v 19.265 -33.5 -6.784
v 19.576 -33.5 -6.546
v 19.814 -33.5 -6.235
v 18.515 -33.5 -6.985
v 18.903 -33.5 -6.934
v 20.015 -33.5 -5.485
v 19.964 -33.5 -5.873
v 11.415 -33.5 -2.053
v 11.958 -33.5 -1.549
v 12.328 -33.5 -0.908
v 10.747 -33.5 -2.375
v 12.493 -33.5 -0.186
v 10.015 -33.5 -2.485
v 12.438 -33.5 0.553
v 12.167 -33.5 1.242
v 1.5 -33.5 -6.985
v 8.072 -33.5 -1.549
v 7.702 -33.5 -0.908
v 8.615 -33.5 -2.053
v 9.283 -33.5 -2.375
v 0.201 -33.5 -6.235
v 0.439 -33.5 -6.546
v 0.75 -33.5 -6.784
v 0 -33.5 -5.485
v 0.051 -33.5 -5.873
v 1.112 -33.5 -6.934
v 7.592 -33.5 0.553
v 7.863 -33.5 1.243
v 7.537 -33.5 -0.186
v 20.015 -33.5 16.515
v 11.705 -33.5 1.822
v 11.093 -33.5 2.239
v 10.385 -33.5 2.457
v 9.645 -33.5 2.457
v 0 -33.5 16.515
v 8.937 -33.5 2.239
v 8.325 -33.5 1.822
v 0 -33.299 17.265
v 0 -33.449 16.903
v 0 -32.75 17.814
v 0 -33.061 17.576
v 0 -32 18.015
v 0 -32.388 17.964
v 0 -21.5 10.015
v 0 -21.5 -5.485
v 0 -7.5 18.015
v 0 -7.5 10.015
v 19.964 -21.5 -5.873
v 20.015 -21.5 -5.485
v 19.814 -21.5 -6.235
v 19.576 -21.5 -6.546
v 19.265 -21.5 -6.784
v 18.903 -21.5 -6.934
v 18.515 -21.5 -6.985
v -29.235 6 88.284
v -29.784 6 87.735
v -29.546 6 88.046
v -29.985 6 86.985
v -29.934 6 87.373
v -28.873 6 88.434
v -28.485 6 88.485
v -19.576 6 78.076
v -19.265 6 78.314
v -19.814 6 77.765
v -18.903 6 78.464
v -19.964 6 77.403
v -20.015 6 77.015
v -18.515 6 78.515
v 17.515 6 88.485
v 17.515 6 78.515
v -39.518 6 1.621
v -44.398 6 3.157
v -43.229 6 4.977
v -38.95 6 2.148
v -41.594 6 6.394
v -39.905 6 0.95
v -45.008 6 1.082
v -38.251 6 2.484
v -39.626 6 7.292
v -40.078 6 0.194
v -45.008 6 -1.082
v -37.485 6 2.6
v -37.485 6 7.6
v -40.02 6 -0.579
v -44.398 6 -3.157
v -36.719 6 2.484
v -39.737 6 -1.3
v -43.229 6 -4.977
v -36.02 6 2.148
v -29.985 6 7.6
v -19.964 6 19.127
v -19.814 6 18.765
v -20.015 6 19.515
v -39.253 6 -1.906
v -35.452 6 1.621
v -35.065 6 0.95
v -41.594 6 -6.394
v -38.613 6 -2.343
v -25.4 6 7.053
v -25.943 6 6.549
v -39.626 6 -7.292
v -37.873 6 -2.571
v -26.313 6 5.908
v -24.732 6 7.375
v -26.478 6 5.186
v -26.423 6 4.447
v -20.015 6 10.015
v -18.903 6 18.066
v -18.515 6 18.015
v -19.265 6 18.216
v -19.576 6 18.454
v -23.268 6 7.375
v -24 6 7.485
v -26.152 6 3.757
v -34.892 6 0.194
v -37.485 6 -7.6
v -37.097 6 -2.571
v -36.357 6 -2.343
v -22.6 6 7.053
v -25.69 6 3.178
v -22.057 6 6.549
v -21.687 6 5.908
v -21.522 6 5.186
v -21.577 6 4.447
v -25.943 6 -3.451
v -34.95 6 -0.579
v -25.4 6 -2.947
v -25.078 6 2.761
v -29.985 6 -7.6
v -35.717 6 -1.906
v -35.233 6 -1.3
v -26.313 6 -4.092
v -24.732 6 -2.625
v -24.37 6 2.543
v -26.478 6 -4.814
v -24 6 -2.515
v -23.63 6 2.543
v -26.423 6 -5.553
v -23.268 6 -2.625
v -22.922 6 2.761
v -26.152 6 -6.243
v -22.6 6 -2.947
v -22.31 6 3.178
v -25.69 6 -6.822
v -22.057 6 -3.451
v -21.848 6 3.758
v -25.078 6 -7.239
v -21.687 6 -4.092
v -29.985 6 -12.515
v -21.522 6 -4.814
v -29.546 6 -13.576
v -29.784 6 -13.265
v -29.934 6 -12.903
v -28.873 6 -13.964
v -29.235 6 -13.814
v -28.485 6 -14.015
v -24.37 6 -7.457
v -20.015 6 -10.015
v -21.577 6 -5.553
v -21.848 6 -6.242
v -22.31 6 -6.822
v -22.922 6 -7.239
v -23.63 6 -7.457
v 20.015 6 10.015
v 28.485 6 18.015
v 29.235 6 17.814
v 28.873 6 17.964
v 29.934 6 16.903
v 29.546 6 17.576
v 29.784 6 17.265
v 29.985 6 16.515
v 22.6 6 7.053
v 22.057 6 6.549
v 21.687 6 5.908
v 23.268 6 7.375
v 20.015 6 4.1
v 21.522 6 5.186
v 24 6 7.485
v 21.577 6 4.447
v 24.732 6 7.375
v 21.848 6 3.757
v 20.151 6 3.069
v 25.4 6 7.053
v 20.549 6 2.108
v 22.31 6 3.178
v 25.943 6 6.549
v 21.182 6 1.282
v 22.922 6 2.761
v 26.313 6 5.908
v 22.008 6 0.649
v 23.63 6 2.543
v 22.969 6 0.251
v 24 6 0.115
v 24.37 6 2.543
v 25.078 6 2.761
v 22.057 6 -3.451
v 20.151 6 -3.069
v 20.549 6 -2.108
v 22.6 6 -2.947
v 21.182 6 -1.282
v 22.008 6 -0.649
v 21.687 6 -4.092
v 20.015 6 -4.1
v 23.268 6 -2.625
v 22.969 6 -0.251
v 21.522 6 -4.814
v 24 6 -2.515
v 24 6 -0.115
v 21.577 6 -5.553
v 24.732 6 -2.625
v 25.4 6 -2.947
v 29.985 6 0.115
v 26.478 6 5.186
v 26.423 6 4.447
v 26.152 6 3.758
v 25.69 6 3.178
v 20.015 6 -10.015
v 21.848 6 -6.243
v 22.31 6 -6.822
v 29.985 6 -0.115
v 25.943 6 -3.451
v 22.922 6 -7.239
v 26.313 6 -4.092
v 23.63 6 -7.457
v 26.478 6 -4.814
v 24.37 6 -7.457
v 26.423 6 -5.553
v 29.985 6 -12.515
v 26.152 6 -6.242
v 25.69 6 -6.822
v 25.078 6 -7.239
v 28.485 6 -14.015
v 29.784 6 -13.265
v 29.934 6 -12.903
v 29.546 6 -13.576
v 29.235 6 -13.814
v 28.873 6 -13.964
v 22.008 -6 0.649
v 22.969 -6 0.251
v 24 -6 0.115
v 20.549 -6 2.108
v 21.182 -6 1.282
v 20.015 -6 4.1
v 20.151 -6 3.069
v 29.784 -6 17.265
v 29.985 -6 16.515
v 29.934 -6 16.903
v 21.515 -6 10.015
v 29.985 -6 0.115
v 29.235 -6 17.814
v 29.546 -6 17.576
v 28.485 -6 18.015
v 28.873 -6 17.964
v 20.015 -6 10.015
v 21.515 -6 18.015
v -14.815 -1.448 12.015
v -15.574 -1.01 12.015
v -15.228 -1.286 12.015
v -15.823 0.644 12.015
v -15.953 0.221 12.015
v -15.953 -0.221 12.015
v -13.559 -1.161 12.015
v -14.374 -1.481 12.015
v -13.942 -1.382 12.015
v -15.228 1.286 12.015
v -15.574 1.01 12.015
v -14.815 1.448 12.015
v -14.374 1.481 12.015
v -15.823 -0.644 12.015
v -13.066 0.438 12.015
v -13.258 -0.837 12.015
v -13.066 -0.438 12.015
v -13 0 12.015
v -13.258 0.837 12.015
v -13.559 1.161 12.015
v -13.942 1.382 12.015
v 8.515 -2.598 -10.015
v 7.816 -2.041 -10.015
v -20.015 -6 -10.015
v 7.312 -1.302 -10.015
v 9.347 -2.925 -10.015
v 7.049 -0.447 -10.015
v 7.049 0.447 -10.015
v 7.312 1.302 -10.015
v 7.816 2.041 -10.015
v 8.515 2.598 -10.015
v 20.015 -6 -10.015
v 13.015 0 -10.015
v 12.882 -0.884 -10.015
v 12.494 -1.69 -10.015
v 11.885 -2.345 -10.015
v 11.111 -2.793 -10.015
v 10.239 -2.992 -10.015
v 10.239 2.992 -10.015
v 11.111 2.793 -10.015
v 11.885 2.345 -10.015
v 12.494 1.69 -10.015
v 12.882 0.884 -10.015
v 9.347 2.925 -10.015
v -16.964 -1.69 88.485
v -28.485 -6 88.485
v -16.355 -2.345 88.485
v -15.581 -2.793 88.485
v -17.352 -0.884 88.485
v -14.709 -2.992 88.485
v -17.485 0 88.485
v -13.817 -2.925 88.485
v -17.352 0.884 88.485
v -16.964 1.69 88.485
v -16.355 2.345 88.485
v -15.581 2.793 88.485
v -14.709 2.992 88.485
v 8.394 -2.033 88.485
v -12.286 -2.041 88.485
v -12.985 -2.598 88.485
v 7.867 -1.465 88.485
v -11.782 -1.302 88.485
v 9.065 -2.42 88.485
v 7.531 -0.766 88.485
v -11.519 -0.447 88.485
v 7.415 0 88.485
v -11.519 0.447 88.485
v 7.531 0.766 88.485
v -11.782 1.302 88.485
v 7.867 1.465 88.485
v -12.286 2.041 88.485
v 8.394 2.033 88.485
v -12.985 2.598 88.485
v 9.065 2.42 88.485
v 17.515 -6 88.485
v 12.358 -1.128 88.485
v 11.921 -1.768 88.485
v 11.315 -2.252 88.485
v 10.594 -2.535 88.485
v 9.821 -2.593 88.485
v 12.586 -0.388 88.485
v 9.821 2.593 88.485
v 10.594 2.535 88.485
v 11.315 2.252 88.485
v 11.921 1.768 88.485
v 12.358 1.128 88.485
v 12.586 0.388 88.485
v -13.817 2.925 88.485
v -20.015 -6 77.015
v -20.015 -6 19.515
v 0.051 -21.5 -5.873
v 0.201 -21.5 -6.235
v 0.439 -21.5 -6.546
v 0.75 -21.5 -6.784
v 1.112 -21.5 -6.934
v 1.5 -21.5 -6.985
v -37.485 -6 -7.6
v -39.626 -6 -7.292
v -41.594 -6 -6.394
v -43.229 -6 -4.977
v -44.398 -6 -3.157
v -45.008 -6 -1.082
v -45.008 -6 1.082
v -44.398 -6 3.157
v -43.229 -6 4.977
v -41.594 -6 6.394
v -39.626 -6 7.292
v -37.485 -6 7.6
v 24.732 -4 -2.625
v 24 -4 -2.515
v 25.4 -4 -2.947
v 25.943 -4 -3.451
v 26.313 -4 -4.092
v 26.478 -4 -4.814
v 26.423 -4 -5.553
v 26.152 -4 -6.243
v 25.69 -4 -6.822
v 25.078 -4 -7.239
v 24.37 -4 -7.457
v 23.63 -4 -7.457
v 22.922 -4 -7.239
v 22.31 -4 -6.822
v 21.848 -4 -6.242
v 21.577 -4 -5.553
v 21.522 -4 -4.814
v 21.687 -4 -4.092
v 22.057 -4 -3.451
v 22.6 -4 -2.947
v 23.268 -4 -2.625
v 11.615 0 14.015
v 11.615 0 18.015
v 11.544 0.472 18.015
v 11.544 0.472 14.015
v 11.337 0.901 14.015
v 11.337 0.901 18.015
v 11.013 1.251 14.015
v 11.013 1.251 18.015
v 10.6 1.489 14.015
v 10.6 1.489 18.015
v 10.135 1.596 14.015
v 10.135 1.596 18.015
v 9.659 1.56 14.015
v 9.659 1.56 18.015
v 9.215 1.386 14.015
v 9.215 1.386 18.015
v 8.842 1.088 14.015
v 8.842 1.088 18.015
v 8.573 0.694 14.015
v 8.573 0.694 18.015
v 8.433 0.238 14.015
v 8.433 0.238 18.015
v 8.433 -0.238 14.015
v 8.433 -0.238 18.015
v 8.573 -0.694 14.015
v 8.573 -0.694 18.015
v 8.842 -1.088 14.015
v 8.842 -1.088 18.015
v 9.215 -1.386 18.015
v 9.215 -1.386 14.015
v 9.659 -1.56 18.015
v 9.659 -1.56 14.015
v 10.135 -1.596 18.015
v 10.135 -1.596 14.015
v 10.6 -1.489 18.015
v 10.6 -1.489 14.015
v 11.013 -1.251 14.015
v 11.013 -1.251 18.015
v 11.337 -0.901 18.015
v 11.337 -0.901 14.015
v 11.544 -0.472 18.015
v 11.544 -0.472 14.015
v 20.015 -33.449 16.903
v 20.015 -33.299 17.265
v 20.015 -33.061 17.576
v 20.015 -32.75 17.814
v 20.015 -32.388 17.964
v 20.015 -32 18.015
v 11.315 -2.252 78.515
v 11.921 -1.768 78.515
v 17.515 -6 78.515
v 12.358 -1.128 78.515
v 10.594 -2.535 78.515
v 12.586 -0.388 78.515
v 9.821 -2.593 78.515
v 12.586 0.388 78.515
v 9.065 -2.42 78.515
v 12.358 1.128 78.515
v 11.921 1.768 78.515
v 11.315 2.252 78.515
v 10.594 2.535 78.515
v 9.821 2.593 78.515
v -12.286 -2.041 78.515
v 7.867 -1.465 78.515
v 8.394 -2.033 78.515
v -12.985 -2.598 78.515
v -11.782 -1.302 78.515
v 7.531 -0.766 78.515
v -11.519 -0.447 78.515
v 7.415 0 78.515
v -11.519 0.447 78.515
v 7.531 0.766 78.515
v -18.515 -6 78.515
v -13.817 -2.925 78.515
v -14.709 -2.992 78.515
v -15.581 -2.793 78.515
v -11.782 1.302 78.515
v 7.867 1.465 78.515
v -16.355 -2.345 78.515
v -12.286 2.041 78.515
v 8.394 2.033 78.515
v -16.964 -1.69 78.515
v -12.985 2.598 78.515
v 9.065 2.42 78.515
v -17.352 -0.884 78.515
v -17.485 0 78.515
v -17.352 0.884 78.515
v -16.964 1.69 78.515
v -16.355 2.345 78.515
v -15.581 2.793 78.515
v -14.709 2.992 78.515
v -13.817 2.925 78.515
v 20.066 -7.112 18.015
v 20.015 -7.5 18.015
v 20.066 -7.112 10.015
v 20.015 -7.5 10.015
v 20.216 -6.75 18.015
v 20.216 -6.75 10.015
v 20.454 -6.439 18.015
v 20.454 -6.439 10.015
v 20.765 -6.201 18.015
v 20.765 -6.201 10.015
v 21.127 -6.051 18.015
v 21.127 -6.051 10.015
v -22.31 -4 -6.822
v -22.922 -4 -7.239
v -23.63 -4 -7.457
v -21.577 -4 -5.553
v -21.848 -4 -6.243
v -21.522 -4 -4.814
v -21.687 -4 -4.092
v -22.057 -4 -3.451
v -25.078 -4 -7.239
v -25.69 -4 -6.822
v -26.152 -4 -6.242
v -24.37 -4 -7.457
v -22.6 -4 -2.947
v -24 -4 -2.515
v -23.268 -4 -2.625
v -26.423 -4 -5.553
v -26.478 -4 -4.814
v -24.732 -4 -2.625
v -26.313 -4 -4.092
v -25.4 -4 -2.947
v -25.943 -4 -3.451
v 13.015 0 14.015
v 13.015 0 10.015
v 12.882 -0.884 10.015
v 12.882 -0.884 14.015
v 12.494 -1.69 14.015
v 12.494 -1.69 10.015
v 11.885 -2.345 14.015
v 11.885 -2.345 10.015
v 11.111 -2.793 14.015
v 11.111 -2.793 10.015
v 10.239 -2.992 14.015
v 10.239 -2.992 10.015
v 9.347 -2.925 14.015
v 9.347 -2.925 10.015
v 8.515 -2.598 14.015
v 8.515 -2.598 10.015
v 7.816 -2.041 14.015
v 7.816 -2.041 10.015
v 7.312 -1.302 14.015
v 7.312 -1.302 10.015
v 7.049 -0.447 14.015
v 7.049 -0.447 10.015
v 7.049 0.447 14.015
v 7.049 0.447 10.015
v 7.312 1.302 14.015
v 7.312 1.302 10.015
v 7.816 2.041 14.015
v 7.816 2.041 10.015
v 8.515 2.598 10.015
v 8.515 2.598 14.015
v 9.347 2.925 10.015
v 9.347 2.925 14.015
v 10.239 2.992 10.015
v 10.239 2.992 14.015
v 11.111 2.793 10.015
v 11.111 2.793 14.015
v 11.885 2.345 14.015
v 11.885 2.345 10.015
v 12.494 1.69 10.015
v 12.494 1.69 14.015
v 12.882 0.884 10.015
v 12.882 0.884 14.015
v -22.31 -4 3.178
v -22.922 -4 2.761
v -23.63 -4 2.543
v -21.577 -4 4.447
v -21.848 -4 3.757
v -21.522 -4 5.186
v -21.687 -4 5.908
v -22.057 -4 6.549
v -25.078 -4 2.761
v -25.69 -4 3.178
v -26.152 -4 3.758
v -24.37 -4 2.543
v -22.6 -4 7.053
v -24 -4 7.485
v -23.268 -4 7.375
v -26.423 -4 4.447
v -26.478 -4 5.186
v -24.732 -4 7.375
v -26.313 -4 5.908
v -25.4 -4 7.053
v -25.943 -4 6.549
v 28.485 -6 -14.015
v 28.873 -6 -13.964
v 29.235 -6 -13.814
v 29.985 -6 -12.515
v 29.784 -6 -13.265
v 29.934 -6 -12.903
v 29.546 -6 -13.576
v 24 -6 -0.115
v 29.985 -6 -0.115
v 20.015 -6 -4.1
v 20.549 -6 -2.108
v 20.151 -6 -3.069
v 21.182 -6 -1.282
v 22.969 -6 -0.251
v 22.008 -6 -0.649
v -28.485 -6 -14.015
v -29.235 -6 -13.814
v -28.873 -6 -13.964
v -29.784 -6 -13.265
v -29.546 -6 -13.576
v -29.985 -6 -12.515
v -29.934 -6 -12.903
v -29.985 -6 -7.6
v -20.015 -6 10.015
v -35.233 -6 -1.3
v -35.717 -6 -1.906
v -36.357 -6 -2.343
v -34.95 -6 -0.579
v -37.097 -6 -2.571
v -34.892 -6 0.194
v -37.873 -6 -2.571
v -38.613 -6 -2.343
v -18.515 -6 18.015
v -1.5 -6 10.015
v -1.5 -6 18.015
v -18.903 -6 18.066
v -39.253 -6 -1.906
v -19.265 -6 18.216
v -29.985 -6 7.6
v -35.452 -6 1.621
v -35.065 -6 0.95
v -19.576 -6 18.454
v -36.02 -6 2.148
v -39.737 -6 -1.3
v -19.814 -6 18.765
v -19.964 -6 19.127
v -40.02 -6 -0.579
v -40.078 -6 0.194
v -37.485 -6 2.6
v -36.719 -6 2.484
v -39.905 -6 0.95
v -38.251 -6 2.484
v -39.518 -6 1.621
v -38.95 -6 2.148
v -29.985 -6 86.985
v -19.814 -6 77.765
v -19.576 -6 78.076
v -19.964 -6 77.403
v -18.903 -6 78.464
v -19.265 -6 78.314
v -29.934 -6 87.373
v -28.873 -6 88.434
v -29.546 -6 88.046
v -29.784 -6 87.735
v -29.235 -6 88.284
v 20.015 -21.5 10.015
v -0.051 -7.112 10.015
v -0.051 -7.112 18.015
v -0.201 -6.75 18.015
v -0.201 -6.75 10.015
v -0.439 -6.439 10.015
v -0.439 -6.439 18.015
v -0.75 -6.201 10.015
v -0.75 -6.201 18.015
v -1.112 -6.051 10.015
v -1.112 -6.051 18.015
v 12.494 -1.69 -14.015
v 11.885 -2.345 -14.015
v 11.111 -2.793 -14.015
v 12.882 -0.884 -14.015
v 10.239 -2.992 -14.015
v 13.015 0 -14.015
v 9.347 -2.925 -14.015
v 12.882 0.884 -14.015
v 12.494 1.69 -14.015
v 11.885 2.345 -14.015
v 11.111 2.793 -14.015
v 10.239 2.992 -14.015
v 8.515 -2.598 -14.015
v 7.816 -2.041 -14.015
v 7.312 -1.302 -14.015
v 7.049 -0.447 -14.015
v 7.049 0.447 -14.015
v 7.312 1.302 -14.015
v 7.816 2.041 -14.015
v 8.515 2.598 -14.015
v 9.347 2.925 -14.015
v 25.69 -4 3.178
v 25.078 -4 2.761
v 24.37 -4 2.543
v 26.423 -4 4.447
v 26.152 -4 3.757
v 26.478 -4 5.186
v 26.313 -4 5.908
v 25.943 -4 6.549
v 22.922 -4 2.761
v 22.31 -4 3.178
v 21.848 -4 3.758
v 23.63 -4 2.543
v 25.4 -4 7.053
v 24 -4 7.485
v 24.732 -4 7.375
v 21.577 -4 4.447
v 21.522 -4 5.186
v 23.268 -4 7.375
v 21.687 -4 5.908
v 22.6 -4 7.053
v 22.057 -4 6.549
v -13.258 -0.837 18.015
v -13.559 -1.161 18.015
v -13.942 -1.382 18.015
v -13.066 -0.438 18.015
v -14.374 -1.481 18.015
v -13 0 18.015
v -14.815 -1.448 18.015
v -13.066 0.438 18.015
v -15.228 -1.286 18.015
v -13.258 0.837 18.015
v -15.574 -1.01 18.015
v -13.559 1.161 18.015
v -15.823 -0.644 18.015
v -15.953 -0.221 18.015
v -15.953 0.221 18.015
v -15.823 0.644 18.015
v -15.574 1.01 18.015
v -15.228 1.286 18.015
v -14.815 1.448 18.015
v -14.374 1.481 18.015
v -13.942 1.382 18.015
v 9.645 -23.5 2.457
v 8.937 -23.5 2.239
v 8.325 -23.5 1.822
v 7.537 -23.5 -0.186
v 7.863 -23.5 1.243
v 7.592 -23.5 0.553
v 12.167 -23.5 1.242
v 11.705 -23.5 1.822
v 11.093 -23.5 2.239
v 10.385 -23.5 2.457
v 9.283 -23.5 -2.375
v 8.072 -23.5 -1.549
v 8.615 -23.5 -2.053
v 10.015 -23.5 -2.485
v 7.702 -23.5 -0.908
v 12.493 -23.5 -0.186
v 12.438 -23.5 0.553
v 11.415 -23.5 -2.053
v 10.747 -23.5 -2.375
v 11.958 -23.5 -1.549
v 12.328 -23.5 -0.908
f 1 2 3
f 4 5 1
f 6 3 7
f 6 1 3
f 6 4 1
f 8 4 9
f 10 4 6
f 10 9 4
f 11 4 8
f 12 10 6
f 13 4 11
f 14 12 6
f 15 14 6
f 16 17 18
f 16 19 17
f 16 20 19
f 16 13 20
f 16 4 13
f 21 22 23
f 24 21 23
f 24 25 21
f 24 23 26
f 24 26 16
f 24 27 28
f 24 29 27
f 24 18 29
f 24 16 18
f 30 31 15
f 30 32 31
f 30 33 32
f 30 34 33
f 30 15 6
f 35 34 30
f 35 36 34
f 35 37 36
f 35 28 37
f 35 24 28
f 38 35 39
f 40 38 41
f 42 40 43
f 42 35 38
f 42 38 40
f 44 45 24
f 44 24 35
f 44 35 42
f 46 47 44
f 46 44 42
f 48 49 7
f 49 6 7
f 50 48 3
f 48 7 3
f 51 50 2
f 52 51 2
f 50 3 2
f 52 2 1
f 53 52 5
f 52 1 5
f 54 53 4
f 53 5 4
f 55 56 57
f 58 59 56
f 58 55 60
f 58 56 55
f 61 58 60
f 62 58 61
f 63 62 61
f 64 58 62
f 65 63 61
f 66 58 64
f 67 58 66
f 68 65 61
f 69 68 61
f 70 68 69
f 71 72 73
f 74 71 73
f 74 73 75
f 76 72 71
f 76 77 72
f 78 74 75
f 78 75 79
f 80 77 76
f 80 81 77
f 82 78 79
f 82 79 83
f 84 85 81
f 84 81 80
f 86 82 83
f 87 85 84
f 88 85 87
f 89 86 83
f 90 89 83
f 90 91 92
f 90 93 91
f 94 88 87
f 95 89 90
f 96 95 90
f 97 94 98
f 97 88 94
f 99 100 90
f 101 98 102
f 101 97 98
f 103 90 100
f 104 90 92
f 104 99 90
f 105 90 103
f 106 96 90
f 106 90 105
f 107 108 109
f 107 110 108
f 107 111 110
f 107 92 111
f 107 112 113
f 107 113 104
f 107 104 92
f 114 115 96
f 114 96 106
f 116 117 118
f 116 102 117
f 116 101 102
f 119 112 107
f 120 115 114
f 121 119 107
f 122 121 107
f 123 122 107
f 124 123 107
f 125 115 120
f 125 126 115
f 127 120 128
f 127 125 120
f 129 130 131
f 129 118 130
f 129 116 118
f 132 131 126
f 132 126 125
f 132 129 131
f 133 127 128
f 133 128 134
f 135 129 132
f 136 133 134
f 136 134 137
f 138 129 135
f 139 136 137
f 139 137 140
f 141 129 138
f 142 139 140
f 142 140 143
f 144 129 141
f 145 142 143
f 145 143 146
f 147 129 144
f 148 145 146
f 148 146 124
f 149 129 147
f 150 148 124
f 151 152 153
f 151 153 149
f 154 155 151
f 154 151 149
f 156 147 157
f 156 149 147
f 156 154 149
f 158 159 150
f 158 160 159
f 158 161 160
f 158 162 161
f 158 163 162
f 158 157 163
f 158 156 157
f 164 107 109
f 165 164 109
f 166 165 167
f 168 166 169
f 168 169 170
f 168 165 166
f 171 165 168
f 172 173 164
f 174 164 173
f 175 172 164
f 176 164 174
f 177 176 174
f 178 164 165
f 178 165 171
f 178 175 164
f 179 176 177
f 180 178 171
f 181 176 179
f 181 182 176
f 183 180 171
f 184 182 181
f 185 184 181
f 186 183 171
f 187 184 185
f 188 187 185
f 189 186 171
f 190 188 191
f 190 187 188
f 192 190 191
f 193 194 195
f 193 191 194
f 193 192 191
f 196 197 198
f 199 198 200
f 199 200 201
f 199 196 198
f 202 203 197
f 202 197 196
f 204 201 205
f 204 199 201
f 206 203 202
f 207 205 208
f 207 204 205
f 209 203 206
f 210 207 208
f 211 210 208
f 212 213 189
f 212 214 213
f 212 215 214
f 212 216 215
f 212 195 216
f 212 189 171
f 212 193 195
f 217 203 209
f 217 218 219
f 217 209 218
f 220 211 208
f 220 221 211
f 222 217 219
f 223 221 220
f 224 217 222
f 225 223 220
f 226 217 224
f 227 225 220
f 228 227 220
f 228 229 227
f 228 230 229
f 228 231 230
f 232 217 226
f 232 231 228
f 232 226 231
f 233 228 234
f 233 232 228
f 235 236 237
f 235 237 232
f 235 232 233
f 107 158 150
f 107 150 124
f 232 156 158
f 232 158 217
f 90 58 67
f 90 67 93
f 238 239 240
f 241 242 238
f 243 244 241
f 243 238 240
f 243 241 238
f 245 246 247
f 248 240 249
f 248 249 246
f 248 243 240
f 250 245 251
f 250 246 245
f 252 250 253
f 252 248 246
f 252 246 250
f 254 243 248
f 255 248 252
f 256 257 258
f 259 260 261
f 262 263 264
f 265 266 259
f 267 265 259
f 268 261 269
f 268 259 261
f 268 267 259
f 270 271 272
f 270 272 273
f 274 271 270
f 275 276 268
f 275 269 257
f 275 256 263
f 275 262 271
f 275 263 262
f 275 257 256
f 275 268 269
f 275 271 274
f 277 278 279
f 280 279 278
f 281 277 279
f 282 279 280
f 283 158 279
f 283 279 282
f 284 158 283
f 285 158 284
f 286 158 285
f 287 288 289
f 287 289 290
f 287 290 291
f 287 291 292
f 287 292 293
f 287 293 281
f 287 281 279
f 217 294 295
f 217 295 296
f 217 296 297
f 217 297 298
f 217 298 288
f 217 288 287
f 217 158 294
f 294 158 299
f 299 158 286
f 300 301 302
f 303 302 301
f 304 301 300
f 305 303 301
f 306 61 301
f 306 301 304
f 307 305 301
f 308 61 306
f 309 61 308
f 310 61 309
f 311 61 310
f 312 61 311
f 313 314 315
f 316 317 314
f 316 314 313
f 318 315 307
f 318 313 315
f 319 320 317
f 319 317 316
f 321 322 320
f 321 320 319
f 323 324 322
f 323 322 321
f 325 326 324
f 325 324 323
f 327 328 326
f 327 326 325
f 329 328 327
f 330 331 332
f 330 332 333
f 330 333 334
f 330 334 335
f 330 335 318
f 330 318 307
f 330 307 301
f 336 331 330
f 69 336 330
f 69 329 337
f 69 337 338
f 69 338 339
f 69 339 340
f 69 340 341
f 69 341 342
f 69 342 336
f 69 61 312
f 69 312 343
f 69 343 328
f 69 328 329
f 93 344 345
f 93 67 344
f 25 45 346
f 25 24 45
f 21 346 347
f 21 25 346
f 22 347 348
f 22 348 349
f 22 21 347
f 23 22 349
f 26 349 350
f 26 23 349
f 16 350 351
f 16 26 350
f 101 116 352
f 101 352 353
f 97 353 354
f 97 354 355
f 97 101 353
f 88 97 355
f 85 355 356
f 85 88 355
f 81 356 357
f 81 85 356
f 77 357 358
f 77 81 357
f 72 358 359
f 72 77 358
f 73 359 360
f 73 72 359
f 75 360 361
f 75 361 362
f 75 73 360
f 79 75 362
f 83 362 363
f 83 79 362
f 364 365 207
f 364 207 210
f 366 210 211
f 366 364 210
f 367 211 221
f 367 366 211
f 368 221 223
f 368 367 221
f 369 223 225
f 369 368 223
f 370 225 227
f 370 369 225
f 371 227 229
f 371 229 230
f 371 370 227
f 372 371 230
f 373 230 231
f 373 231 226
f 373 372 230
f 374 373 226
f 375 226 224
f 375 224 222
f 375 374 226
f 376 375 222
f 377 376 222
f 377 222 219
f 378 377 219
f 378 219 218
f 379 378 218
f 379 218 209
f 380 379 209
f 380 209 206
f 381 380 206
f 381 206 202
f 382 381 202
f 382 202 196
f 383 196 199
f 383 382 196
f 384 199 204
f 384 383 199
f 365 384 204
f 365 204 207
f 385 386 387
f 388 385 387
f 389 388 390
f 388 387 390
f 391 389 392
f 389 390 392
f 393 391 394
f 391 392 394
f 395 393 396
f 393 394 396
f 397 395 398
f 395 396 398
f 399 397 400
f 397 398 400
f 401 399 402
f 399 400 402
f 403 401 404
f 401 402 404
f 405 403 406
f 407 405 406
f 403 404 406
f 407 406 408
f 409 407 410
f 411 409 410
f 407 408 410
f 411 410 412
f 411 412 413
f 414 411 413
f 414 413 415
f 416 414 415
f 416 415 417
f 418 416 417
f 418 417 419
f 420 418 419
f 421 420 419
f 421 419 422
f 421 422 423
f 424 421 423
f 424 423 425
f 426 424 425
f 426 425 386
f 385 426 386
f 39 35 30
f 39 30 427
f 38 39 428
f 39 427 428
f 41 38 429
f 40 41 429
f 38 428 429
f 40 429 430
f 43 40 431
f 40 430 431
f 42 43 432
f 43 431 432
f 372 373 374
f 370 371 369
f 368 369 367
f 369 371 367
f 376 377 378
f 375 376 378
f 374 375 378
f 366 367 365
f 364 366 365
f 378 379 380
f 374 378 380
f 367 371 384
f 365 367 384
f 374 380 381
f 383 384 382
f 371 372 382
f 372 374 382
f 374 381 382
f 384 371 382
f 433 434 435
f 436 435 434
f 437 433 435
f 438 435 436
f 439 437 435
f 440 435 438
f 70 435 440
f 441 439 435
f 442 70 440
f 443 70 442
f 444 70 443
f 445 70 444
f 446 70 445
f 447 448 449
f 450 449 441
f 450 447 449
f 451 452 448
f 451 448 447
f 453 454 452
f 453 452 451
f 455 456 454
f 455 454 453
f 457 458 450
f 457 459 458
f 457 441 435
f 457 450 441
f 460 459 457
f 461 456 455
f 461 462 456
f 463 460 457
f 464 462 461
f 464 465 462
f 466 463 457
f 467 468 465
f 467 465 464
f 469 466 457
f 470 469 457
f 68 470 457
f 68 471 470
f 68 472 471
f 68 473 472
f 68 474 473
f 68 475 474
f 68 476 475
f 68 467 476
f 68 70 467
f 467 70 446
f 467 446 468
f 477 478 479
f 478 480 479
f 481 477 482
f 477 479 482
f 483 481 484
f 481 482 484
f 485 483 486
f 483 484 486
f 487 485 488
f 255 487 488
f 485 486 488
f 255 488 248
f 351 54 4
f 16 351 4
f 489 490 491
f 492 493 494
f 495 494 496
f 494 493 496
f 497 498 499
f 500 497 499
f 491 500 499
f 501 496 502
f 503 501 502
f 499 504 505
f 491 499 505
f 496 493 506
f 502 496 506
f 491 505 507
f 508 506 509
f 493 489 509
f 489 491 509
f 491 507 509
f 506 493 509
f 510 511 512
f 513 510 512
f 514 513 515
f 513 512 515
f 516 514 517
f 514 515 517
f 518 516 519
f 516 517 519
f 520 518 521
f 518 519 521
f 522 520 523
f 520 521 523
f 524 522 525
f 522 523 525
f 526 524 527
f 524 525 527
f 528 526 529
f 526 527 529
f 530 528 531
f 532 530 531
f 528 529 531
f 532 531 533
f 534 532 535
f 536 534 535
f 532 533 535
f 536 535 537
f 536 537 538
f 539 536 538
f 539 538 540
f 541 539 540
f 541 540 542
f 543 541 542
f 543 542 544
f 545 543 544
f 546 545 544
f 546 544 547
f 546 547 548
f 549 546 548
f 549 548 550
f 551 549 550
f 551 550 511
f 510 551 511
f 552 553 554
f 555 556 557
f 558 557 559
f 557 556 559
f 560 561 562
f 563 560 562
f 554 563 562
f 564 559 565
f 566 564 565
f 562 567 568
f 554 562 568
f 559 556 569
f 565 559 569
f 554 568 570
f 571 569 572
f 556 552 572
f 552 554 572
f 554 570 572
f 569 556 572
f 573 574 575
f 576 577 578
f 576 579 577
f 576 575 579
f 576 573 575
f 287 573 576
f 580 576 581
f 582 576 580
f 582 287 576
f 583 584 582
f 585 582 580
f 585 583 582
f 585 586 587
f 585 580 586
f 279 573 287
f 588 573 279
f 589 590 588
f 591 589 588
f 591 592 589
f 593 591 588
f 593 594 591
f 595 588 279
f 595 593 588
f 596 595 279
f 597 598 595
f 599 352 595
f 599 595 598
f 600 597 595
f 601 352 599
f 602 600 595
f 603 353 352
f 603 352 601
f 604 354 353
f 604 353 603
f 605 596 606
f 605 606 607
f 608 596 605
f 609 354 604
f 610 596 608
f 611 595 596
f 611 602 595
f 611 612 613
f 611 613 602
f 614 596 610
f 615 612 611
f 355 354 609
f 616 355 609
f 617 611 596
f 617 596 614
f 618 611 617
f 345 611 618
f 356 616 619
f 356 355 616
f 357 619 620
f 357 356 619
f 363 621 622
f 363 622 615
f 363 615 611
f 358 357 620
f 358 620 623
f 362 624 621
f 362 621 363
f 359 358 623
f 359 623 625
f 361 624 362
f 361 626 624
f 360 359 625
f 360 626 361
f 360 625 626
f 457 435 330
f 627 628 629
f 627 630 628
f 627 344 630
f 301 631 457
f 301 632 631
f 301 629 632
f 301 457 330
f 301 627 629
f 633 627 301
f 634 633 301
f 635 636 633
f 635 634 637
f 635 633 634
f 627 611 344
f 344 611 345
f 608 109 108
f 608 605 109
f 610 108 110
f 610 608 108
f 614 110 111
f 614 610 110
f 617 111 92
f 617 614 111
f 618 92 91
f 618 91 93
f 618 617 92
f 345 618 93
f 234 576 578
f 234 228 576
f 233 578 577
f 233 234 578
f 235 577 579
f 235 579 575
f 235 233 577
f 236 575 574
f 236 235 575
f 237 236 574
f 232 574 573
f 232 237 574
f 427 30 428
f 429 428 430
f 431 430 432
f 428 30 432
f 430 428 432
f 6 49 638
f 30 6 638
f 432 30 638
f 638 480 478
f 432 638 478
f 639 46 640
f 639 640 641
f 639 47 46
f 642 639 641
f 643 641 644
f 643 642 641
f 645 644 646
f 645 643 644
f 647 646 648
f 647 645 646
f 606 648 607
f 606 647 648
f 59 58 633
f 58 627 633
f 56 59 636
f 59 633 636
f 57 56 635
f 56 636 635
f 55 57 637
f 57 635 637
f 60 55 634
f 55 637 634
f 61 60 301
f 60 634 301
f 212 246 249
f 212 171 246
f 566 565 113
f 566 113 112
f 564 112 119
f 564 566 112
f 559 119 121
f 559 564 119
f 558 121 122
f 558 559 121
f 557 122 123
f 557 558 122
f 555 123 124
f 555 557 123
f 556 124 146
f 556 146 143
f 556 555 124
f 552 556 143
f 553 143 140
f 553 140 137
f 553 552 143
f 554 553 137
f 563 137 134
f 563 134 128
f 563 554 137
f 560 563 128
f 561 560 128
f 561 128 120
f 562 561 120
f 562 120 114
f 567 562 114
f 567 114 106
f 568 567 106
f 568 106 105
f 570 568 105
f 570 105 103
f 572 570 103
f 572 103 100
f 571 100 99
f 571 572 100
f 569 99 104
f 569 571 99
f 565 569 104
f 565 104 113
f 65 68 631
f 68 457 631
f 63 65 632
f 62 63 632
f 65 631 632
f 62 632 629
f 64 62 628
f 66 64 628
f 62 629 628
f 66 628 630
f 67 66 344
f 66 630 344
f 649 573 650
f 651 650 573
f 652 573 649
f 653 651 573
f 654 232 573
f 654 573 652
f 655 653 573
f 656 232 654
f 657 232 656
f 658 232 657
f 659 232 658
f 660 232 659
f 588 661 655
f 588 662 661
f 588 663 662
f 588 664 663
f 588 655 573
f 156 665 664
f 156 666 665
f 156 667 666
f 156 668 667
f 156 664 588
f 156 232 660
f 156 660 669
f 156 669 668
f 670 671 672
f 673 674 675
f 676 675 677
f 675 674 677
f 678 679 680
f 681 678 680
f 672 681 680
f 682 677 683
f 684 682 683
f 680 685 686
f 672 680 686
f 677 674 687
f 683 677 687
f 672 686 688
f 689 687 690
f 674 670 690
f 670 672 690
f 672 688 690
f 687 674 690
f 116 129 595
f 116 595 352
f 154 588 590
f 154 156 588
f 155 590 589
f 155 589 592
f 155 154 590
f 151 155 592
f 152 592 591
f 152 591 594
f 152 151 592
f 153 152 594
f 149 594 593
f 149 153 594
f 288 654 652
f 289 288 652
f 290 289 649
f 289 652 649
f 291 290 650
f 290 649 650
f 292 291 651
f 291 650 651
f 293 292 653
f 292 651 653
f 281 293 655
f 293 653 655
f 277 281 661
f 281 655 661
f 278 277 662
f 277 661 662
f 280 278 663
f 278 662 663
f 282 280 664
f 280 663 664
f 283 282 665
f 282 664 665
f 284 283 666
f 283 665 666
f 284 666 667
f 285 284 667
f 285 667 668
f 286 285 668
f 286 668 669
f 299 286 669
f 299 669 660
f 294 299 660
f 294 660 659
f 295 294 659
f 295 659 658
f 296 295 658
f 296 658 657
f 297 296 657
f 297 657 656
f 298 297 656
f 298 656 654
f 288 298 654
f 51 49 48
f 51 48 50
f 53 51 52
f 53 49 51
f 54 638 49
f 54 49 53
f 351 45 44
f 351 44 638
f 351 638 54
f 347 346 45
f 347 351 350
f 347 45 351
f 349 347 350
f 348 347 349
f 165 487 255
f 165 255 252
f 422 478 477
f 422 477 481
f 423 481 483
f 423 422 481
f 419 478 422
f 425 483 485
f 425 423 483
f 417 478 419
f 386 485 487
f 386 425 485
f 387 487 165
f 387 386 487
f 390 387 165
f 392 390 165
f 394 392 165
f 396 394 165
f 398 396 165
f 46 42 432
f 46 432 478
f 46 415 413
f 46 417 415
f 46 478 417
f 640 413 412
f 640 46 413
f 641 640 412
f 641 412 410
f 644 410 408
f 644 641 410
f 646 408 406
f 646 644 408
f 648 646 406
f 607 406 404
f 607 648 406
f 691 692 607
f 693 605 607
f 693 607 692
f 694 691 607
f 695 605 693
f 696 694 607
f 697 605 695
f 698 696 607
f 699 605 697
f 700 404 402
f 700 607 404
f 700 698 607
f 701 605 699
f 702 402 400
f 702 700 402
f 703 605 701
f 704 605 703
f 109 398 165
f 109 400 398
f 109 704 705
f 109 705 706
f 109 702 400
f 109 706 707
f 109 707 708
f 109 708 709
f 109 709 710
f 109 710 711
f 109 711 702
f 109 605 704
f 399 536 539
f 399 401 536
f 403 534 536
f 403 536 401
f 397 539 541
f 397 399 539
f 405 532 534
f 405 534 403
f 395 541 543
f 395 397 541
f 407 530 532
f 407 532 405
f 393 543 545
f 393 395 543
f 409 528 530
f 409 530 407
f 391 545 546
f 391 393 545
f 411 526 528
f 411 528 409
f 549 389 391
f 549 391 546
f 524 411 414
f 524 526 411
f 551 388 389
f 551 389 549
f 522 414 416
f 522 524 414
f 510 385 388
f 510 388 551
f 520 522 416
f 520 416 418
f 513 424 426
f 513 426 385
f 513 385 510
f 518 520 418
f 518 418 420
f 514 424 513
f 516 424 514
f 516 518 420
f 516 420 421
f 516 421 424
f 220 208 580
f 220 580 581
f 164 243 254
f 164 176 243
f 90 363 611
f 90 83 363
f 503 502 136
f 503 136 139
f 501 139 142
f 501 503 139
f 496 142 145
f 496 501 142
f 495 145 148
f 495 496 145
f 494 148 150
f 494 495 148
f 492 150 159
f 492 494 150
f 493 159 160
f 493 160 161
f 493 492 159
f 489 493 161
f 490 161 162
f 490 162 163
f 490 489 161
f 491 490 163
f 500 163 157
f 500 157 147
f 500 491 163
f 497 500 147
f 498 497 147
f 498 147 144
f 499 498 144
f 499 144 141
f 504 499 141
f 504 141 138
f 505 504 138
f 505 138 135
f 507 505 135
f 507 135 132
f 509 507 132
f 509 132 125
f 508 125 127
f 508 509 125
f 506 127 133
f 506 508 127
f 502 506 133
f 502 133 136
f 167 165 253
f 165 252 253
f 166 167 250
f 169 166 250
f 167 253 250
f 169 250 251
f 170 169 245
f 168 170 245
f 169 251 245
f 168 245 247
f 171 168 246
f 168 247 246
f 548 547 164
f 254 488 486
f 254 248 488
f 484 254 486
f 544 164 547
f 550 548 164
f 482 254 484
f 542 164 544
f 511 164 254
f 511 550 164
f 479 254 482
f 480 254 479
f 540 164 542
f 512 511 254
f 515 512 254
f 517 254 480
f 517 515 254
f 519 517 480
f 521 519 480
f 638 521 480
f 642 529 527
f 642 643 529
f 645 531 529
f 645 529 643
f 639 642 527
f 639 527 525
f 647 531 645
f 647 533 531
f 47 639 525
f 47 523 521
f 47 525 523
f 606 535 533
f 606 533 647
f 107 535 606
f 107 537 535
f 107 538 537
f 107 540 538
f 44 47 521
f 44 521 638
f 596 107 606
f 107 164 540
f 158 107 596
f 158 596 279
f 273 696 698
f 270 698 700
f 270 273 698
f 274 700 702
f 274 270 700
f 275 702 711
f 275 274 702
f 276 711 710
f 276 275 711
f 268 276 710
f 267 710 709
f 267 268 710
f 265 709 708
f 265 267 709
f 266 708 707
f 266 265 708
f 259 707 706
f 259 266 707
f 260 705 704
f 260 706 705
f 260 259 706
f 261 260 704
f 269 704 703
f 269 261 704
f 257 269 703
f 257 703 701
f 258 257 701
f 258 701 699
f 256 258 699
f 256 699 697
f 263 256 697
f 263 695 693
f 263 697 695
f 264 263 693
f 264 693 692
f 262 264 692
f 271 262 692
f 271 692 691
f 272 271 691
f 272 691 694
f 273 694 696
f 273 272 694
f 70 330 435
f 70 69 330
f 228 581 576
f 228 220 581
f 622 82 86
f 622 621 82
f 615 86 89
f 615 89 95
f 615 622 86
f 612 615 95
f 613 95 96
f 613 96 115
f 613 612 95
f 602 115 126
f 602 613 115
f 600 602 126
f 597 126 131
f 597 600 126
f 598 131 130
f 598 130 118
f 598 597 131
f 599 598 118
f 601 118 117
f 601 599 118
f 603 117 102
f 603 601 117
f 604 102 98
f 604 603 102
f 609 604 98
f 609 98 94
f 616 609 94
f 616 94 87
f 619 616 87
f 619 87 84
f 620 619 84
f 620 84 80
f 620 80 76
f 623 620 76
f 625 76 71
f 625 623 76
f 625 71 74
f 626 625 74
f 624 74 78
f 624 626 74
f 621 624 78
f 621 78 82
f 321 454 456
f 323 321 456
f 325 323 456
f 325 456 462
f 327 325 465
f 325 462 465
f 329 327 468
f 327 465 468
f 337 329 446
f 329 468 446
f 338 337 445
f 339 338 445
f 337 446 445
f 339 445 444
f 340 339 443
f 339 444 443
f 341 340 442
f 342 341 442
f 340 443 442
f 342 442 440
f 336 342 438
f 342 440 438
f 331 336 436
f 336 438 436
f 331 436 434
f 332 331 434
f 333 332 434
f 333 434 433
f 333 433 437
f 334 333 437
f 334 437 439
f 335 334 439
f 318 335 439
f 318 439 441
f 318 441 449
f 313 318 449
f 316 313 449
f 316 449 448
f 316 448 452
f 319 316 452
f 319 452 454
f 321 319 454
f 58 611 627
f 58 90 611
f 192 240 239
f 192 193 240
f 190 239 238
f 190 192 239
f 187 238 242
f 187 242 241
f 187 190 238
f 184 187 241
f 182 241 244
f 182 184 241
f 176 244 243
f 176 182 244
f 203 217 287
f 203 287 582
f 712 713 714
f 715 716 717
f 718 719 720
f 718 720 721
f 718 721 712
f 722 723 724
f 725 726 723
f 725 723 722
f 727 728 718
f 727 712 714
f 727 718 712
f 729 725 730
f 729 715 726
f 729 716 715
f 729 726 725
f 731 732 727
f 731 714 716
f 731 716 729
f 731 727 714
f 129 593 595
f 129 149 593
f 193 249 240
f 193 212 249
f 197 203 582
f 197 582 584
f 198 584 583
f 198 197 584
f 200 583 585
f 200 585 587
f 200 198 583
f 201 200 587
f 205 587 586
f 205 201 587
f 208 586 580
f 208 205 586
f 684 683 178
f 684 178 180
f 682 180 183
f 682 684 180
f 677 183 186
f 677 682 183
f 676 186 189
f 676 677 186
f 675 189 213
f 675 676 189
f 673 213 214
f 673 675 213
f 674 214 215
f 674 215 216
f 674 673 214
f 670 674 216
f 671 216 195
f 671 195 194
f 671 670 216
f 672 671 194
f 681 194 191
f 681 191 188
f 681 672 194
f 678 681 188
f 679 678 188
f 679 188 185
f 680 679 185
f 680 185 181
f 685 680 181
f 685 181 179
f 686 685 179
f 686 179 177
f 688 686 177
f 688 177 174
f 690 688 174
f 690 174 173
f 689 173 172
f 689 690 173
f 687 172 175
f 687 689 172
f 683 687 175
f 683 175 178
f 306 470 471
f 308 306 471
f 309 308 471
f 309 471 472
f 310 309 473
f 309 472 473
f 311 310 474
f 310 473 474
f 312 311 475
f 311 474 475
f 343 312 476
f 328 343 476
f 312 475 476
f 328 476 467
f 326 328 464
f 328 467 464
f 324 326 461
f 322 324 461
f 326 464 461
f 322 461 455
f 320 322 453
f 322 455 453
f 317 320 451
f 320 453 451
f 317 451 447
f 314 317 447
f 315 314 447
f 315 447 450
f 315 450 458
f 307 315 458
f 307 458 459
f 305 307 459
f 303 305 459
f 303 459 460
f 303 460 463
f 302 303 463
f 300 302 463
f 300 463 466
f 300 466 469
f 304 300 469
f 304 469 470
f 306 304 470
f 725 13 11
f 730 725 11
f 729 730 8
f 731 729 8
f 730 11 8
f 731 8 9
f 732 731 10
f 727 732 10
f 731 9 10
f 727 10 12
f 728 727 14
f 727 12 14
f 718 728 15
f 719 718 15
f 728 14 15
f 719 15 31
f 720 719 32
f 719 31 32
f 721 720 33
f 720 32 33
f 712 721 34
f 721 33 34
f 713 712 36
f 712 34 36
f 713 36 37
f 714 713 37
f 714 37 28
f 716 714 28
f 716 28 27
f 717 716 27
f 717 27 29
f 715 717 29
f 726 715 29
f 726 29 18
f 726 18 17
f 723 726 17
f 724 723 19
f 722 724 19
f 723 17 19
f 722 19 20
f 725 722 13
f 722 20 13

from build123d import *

# Parameters (mm, degrees)
SKETCH1_R               = 2.485
SKETCH1_R_2             = 2.6
BOSS_EXTRUDE1_DEPTH     = 6
SKETCH2_R               = 2.485
BOSS_EXTRUDE2_DEPTH     = 2
SKETCH3_R               = 1.6
CUT_EXTRUDE1_DEPTH      = 10
SKETCH4_R               = 3
CUT_EXTRUDE2_DEPTH      = 28.03
BOSS_EXTRUDE3_DEPTH     = 20.015
SKETCH6_R               = 2.485
CUT_EXTRUDE3_DEPTH      = 10
CUT_EXTRUDE6_DEPTH      = 91.116192357
CUT_EXTRUDE6_DEPTH_BACK = 6
SKETCH10_R              = 1.485
SKETCH9_R               = 3
SKETCH9_R_2             = 1.485
SKETCH9_R_3             = 2.6
SKETCH9_R_4             = 1.6
CUT_EXTRUDE5_DEPTH      = 109.243744046
FILLET1_R               = 1.5


with BuildPart() as part:
    # Sketch1 → Boss-Extrude1 (new, symmetric)
    with BuildSketch(Plane(origin=(0, 0, 0), x_dir=(1, 0, 0), z_dir=(0, 1, 0))):
        with BuildLine():
            Line((20.015, -4.1), (20.015, -10.015))
            Line((20.015, -10.015), (-20.015, -10.015))
            Line((-20.015, -10.015), (-20.015, 10.015))
            Line((-20.015, 10.015), (20.015, 10.015))
            Line((20.015, 10.015), (20.015, 4.1))
            ThreePointArc((20.015, 4.1), (21.182179477, 1.282179477), (24, 0.115))
            Line((24, 0.115), (29.985, 0.115))
            Line((29.985, 0.115), (29.985, 14.015))
            Line((29.985, 14.015), (-29.985, 14.015))
            Line((-29.985, 14.015), (-29.985, 7.6))
            Line((-29.985, 7.6), (-37.485, 7.6))
            ThreePointArc((-37.485, 7.6), (-45.085, 0), (-37.485, -7.6))
            Line((-37.485, -7.6), (-29.985, -7.6))
            Line((-29.985, -7.6), (-29.985, -88.485))
            Line((-29.985, -88.485), (17.515, -88.485))
            Line((17.515, -88.485), (17.515, -78.515))
            Line((17.515, -78.515), (-20.015, -78.515))
            Line((-20.015, -78.515), (-20.015, -18.015))
            Line((-20.015, -18.015), (29.985, -18.015))
            Line((29.985, -18.015), (29.985, -0.115))
            Line((29.985, -0.115), (24, -0.115))
            ThreePointArc((24, -0.115), (21.182179477, -1.282179477), (20.015, -4.1))
        make_face()
        with Locations(Location((-24, -5, 0), (0, 0, 270))):
            Circle(SKETCH1_R, mode=Mode.SUBTRACT)
        with Locations(Location((-24, 5, 0), (0, 0, 270))):
            Circle(SKETCH1_R, mode=Mode.SUBTRACT)
        with Locations(Location((24, -5, 0), (0, 0, 270))):
            Circle(SKETCH1_R, mode=Mode.SUBTRACT)
        with Locations(Location((24, 5, 0), (0, 0, 270))):
            Circle(SKETCH1_R, mode=Mode.SUBTRACT)
        with Locations(Location((-37.485, 0, 0), (0, 0, 270))):
            Circle(SKETCH1_R_2, mode=Mode.SUBTRACT)
    extrude(amount=BOSS_EXTRUDE1_DEPTH, both=True)

    # Sketch2 → Boss-Extrude2 (add)
    with BuildSketch(Plane.XZ.offset(6)):
        with Locations(Location((24, -5, 0), (0, 0, 90))):
            Circle(SKETCH2_R)
        with Locations(Location((24, 5, 0), (0, 0, 90))):
            Circle(SKETCH2_R)
        with Locations(Location((-24, -5, 0), (0, 0, 90))):
            Circle(SKETCH2_R)
        with Locations(Location((-24, 5, 0), (0, 0, 90))):
            Circle(SKETCH2_R)
    extrude(amount=-BOSS_EXTRUDE2_DEPTH)

    # Sketch3 → Cut-Extrude1 (cut)
    with BuildSketch(Plane.XY.offset(18.015)):
        with Locations((10.015, 0)):
            Circle(SKETCH3_R)
    extrude(amount=-CUT_EXTRUDE1_DEPTH, mode=Mode.SUBTRACT)

    # Sketch4 → Cut-Extrude2 (cut)
    with BuildSketch(Plane(origin=(0, 0, -14.015), x_dir=(-1, 0, 0), z_dir=(0, 0, -1))):
        with Locations(Location((-10.015, 0, 0), (0, 0, 180))):
            Circle(SKETCH4_R)
    extrude(amount=-CUT_EXTRUDE2_DEPTH, mode=Mode.SUBTRACT)

    # Sketch5 → Boss-Extrude3 (add)
    with BuildSketch(Plane(origin=(0, 0, 0), x_dir=(0, 0, -1), z_dir=(1, 0, 0))):
        Polygon((-18.015, -6), (-10.015, -6), (-10.015, -21.5), (6.985, -21.5), (6.985, -33.5), (-18.015, -33.5), align=None)
    extrude(amount=BOSS_EXTRUDE3_DEPTH)

    # Sketch6 → Cut-Extrude3 (cut)
    with BuildSketch(Plane.XZ.offset(33.5)):
        with Locations(Location((10.015, 0, 0), (0, 0, 270))):
            Circle(SKETCH6_R)
    extrude(amount=-CUT_EXTRUDE3_DEPTH, mode=Mode.SUBTRACT)

    # Sketch10 → Cut-Extrude6 (cut, two sides: drawn at the far end of the back side and taken through both)
    with BuildSketch(Plane.XY.offset(18.015).offset(-CUT_EXTRUDE6_DEPTH_BACK)):
        with Locations((-14.485, 0)):
            Circle(SKETCH10_R)
    extrude(amount=CUT_EXTRUDE6_DEPTH + CUT_EXTRUDE6_DEPTH_BACK, mode=Mode.SUBTRACT)

    # Sketch9 → Cut-Extrude5 (cut, through all)
    # profile 1 of 3: a face of its own
    with BuildSketch(Plane(origin=(0, 0, 78.515), x_dir=(-1, 0, 0), z_dir=(0, 0, -1))):
        with Locations((14.485, 0)):
            Circle(SKETCH9_R)
        with Locations(Location((14.485, 0, 0), (0, 0, 180))):
            Circle(SKETCH9_R_2, mode=Mode.SUBTRACT)
    # profile 2 of 3: a face of its own
    with BuildSketch(Plane(origin=(0, 0, 78.515), x_dir=(-1, 0, 0), z_dir=(0, 0, -1))):
        with Locations((-10.015, 0)):
            Circle(SKETCH9_R_3)
        with Locations(Location((-10.015, 0, 0), (0, 0, 180))):
            Circle(SKETCH9_R_4, mode=Mode.SUBTRACT)
    # profile 3 of 3: a face of its own
    with BuildSketch(Plane(origin=(0, 0, 78.515), x_dir=(-1, 0, 0), z_dir=(0, 0, -1))):
        with Locations(Location((-10.015, 0, 0), (0, 0, 180))):
            Circle(SKETCH9_R_4)
    extrude(amount=-CUT_EXTRUDE5_DEPTH, mode=Mode.SUBTRACT)

    # Fillet1
    fillet1_edges = [part.edges().sort_by_distance(p)[0] for p in [
        (20.015, -6, 14.015),
        (0, -6, 14.015),
        (20.015, -27.5, -6.985),
        (0, -27.5, -6.985),
        (10.0075, -33.5, 18.015),
        (-29.985, 0, -14.015),
        (29.985, 0, -14.015),
        (29.985, 0, 18.015),
        (-20.015, 0, 18.015),
        (-20.015, 0, 78.515),
        (-29.985, 0, 88.485),
    ]]
    fillet(fillet1_edges, radius=FILLET1_R)


solid = part.part
